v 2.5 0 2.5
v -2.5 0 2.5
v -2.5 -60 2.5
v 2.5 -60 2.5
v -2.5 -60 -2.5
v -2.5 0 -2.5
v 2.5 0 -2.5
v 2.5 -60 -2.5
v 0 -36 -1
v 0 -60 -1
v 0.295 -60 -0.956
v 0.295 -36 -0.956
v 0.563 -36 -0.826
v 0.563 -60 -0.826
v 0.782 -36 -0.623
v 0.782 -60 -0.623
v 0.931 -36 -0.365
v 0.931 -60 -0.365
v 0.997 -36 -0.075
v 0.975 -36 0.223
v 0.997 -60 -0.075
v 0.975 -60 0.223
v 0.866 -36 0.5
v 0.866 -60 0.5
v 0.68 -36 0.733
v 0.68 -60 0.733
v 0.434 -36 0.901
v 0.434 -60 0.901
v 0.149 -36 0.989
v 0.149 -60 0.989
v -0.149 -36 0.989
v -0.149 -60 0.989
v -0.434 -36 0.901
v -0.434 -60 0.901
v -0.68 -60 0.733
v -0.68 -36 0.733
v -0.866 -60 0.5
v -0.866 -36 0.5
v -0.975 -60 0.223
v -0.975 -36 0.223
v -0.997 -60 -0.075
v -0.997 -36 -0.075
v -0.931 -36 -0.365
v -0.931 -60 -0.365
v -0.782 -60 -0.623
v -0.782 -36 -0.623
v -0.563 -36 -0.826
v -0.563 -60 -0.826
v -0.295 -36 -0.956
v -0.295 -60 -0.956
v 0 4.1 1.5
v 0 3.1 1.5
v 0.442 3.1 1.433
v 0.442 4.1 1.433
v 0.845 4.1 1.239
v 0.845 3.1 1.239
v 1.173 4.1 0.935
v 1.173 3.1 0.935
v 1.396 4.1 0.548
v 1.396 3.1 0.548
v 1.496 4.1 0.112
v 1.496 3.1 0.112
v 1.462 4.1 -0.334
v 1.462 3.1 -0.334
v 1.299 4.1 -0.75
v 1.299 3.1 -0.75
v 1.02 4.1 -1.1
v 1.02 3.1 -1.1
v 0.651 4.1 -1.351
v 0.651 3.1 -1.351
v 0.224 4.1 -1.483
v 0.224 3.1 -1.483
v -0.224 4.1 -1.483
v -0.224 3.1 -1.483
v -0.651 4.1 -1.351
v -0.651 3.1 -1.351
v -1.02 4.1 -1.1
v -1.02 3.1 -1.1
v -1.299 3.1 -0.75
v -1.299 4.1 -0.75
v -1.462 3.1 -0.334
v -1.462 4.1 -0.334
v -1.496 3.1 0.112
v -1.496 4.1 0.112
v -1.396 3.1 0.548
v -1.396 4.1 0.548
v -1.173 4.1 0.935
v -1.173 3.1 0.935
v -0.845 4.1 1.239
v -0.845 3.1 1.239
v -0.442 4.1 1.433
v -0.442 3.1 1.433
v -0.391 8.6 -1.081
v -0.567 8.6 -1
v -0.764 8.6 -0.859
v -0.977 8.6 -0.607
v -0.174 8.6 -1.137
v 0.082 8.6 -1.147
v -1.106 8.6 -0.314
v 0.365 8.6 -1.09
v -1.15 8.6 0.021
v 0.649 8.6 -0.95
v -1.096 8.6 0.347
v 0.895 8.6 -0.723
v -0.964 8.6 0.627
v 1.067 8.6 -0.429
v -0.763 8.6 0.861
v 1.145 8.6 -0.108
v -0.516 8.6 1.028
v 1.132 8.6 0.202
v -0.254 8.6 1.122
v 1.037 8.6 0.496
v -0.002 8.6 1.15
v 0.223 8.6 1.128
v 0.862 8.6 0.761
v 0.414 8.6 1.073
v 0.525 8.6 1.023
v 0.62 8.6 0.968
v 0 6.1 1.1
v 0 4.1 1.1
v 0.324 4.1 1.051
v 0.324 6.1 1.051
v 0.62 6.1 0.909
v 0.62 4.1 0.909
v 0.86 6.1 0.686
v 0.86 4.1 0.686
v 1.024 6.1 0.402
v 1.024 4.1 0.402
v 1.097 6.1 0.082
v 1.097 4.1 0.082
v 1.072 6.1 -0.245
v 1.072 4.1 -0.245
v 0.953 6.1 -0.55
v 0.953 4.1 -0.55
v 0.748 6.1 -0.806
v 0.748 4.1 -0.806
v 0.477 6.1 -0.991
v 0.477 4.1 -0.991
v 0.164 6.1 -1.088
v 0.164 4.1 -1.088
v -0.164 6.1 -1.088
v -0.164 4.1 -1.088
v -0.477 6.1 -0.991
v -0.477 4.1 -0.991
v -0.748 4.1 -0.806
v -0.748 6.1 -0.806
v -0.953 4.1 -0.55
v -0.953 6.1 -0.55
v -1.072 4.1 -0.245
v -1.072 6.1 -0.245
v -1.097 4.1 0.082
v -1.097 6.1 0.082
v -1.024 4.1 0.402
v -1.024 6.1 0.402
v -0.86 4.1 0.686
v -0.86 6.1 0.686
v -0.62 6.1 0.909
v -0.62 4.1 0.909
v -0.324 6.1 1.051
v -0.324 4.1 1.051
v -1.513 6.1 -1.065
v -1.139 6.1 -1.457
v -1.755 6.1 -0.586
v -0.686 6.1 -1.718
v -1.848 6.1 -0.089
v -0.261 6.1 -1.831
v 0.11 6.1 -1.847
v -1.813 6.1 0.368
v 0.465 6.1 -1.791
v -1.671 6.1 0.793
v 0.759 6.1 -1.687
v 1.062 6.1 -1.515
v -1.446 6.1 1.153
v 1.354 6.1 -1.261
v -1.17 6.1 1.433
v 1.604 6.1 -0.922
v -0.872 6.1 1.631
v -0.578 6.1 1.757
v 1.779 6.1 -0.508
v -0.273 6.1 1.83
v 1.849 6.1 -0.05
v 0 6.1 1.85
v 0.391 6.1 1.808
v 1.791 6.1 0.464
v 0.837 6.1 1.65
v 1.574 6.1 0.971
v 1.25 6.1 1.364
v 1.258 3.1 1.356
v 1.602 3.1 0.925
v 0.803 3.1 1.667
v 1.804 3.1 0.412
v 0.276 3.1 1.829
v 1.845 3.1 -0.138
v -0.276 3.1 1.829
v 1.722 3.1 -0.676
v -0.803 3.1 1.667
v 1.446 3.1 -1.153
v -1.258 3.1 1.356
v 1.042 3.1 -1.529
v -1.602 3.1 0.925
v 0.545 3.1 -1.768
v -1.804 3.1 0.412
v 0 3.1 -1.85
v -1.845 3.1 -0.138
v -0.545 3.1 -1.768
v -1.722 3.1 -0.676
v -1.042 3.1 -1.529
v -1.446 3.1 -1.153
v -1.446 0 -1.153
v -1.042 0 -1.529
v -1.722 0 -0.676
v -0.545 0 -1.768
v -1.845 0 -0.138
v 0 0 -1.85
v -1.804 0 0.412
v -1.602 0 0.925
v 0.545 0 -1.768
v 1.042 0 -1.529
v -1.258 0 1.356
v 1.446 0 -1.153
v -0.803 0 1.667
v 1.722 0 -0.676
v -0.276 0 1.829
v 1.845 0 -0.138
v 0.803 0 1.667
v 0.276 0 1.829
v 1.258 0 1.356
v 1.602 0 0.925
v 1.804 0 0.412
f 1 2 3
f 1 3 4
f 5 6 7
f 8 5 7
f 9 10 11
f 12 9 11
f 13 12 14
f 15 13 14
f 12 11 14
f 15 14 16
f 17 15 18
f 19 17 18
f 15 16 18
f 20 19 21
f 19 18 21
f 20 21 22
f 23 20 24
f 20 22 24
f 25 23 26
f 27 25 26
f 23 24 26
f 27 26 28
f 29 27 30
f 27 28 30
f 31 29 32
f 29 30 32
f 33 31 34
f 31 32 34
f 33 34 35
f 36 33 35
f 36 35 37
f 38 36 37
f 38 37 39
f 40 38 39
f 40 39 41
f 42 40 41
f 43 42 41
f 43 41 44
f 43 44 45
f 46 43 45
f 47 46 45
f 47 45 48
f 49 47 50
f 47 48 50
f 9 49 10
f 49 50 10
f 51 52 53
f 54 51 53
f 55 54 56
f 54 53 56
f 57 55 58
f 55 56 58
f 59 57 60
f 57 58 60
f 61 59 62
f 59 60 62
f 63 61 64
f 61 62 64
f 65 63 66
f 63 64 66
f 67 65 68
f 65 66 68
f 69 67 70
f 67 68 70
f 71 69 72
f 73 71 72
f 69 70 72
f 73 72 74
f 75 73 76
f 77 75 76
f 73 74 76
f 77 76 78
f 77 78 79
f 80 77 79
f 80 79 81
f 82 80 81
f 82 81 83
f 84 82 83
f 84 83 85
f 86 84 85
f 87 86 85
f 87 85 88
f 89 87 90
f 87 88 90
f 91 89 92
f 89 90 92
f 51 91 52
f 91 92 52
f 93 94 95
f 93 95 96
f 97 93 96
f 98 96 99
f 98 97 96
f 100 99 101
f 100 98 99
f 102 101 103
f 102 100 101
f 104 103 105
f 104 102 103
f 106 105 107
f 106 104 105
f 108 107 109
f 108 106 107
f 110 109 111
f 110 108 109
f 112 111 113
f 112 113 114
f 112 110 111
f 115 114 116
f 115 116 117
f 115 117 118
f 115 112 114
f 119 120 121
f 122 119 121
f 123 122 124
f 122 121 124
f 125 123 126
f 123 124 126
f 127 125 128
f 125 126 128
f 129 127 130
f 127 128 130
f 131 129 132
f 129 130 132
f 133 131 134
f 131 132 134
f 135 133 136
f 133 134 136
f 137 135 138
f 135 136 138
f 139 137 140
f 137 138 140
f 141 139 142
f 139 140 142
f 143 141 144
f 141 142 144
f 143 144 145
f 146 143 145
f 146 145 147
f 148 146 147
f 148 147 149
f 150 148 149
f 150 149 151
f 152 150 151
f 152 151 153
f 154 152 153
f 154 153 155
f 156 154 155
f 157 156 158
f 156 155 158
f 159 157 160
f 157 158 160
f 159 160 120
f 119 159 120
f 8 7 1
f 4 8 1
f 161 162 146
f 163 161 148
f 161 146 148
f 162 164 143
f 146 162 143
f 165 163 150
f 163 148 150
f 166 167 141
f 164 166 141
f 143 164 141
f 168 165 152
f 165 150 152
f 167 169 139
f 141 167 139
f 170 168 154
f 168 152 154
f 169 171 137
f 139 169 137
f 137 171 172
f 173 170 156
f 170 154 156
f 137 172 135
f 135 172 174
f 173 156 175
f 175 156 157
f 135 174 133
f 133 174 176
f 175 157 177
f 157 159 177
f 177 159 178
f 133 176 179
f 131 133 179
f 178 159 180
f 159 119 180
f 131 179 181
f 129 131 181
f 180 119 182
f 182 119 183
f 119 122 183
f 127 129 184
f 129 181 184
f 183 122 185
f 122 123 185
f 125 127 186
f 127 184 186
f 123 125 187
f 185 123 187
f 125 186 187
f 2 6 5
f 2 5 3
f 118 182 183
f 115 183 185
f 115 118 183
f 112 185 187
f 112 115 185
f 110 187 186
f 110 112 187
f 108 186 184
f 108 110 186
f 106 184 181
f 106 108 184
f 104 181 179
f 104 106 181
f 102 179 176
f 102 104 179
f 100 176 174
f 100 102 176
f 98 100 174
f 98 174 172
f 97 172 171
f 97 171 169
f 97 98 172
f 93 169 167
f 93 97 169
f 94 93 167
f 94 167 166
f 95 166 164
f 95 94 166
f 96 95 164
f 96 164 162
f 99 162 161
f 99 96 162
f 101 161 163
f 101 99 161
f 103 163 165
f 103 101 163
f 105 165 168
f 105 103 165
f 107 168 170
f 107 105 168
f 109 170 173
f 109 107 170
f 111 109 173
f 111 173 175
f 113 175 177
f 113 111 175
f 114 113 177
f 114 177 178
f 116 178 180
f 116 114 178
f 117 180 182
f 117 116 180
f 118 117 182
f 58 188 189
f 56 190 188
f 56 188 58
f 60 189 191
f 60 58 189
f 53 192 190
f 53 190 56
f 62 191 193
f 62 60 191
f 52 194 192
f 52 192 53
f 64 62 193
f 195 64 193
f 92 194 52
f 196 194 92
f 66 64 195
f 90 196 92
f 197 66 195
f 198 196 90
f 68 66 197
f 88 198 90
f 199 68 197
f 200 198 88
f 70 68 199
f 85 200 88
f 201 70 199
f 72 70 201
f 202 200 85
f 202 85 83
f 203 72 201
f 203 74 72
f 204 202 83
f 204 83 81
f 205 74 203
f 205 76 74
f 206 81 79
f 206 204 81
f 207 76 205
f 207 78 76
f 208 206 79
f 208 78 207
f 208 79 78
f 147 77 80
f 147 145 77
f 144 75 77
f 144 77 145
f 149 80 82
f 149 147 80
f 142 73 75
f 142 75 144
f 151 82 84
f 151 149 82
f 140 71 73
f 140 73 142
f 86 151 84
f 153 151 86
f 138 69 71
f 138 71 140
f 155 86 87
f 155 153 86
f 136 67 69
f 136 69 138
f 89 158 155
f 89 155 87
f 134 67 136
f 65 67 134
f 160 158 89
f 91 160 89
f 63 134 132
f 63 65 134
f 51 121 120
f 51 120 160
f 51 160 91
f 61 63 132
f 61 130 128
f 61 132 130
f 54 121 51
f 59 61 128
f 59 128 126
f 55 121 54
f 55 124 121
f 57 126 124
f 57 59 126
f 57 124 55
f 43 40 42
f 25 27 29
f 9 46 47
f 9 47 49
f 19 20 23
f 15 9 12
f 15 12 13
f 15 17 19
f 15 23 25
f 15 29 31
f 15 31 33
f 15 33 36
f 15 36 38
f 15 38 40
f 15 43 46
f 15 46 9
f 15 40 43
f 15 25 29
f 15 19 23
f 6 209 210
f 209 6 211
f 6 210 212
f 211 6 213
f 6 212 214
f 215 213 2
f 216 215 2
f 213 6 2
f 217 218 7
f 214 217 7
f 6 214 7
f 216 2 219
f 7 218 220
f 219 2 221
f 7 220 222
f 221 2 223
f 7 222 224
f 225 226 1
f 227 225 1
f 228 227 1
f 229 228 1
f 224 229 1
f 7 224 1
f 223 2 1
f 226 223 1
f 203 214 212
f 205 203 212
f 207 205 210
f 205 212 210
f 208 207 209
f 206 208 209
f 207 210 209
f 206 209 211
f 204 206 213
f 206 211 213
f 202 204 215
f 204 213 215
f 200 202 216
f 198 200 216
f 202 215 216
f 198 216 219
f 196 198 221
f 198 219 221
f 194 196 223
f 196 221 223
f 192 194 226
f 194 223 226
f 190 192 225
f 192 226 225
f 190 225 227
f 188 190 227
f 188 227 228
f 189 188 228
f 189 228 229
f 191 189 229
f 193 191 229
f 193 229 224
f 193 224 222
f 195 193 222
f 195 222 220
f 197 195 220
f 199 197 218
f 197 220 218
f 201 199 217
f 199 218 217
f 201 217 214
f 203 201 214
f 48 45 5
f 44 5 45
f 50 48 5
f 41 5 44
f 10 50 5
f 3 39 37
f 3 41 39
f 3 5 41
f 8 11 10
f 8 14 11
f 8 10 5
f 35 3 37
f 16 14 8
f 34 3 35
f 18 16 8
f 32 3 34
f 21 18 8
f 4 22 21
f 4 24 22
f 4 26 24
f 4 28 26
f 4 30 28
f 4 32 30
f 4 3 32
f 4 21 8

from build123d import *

# Parameters (mm, degrees)
SKETCH1_R           = 1.85
BOSS_EXTRUDE1_DEPTH = 3.1
SKETCH2_R           = 1.5
BOSS_EXTRUDE2_DEPTH = 1
SKETCH3_R           = 1.1
BOSS_EXTRUDE3_DEPTH = 2
SKETCH6_W           = 5
SKETCH6_H           = 5
BOSS_EXTRUDE4_DEPTH = 60
SKETCH7_R           = 1
CUT_EXTRUDE1_DEPTH  = 24


with BuildPart() as part:
    # Sketch1 → Boss-Extrude1 (new body)
    with BuildSketch(Plane(origin=(0, 0, 0), x_dir=(1, 0, 0), z_dir=(0, 1, 0))):
        with Locations(Location((0, 0, 0), (0, 0, 90))):
            Circle(SKETCH1_R)
    extrude(amount=BOSS_EXTRUDE1_DEPTH)

    # Sketch2 → Boss-Extrude2 (add)
    with BuildSketch(Plane(origin=(0, 3.1, 0), x_dir=(1, 0, 0), z_dir=(0, 1, 0))):
        with Locations(Location((0, 0, 0), (0, 0, 270))):
            Circle(SKETCH2_R)
    extrude(amount=BOSS_EXTRUDE2_DEPTH)

    # Sketch3 → Boss-Extrude3 (add)
    with BuildSketch(Plane(origin=(0, 4.1, 0), x_dir=(1, 0, 0), z_dir=(0, 1, 0))):
        with Locations(Location((0, 0, 0), (0, 0, 270))):
            Circle(SKETCH3_R)
    extrude(amount=BOSS_EXTRUDE3_DEPTH)

    # Loft1: read off the stored shape, not the designer's step
    # Loft1: loft between two sections, ruled curve by curve
    loft1_from = [
        Edge.make_bspline([(0, 6.1, 1.85), (3.7, 6.1, 1.85), (3.7, 6.1, -1.85), (0, 6.1, -1.85), (-3.7, 6.1, -1.85), (-3.7, 6.1, 1.85), (0, 6.1, 1.85)], [0, 0, 0, 0, 0.5, 0.5, 0.5, 1, 1, 1, 1], 3, [1, 0.333333333, 0.333333333, 1, 0.333333333, 0.333333333, 1]),
    ]
    loft1_to = [
        Edge.make_bspline([(0.620465421, 8.6, 0.968257539), (2.556980499, 8.6, -0.272673303), (1.316049657, 8.6, -2.209188381), (-0.620465421, 8.6, -0.968257539), (-2.556980499, 8.6, 0.272673303), (-1.316049657, 8.6, 2.209188381), (0.620465421, 8.6, 0.968257539)], [0, 0, 0, 0, 0.5, 0.5, 0.5, 1, 1, 1, 1], 3, [1, 0.333333333, 0.333333333, 1, 0.333333333, 0.333333333, 1]),
    ]
    loft1 = Solid(Shell([*[Face.make_surface_from_curves(loft1_from[k], loft1_to[k]) for k in range(1)], Face(Wire(loft1_from)), Face(Wire(loft1_to))]))
    add(loft1)

    # Sketch6 → Boss-Extrude4 (add)
    with BuildSketch(Plane.XZ):
        Rectangle(SKETCH6_W, SKETCH6_H)
    extrude(amount=BOSS_EXTRUDE4_DEPTH)

    # Sketch7 → Cut-Extrude1 (cut)
    with BuildSketch(Plane.XZ.offset(60)):
        with Locations(Location((0, 0, 0), (0, 0, 270))):
            Circle(SKETCH7_R)
    extrude(amount=-CUT_EXTRUDE1_DEPTH, mode=Mode.SUBTRACT)


solid = part.part
